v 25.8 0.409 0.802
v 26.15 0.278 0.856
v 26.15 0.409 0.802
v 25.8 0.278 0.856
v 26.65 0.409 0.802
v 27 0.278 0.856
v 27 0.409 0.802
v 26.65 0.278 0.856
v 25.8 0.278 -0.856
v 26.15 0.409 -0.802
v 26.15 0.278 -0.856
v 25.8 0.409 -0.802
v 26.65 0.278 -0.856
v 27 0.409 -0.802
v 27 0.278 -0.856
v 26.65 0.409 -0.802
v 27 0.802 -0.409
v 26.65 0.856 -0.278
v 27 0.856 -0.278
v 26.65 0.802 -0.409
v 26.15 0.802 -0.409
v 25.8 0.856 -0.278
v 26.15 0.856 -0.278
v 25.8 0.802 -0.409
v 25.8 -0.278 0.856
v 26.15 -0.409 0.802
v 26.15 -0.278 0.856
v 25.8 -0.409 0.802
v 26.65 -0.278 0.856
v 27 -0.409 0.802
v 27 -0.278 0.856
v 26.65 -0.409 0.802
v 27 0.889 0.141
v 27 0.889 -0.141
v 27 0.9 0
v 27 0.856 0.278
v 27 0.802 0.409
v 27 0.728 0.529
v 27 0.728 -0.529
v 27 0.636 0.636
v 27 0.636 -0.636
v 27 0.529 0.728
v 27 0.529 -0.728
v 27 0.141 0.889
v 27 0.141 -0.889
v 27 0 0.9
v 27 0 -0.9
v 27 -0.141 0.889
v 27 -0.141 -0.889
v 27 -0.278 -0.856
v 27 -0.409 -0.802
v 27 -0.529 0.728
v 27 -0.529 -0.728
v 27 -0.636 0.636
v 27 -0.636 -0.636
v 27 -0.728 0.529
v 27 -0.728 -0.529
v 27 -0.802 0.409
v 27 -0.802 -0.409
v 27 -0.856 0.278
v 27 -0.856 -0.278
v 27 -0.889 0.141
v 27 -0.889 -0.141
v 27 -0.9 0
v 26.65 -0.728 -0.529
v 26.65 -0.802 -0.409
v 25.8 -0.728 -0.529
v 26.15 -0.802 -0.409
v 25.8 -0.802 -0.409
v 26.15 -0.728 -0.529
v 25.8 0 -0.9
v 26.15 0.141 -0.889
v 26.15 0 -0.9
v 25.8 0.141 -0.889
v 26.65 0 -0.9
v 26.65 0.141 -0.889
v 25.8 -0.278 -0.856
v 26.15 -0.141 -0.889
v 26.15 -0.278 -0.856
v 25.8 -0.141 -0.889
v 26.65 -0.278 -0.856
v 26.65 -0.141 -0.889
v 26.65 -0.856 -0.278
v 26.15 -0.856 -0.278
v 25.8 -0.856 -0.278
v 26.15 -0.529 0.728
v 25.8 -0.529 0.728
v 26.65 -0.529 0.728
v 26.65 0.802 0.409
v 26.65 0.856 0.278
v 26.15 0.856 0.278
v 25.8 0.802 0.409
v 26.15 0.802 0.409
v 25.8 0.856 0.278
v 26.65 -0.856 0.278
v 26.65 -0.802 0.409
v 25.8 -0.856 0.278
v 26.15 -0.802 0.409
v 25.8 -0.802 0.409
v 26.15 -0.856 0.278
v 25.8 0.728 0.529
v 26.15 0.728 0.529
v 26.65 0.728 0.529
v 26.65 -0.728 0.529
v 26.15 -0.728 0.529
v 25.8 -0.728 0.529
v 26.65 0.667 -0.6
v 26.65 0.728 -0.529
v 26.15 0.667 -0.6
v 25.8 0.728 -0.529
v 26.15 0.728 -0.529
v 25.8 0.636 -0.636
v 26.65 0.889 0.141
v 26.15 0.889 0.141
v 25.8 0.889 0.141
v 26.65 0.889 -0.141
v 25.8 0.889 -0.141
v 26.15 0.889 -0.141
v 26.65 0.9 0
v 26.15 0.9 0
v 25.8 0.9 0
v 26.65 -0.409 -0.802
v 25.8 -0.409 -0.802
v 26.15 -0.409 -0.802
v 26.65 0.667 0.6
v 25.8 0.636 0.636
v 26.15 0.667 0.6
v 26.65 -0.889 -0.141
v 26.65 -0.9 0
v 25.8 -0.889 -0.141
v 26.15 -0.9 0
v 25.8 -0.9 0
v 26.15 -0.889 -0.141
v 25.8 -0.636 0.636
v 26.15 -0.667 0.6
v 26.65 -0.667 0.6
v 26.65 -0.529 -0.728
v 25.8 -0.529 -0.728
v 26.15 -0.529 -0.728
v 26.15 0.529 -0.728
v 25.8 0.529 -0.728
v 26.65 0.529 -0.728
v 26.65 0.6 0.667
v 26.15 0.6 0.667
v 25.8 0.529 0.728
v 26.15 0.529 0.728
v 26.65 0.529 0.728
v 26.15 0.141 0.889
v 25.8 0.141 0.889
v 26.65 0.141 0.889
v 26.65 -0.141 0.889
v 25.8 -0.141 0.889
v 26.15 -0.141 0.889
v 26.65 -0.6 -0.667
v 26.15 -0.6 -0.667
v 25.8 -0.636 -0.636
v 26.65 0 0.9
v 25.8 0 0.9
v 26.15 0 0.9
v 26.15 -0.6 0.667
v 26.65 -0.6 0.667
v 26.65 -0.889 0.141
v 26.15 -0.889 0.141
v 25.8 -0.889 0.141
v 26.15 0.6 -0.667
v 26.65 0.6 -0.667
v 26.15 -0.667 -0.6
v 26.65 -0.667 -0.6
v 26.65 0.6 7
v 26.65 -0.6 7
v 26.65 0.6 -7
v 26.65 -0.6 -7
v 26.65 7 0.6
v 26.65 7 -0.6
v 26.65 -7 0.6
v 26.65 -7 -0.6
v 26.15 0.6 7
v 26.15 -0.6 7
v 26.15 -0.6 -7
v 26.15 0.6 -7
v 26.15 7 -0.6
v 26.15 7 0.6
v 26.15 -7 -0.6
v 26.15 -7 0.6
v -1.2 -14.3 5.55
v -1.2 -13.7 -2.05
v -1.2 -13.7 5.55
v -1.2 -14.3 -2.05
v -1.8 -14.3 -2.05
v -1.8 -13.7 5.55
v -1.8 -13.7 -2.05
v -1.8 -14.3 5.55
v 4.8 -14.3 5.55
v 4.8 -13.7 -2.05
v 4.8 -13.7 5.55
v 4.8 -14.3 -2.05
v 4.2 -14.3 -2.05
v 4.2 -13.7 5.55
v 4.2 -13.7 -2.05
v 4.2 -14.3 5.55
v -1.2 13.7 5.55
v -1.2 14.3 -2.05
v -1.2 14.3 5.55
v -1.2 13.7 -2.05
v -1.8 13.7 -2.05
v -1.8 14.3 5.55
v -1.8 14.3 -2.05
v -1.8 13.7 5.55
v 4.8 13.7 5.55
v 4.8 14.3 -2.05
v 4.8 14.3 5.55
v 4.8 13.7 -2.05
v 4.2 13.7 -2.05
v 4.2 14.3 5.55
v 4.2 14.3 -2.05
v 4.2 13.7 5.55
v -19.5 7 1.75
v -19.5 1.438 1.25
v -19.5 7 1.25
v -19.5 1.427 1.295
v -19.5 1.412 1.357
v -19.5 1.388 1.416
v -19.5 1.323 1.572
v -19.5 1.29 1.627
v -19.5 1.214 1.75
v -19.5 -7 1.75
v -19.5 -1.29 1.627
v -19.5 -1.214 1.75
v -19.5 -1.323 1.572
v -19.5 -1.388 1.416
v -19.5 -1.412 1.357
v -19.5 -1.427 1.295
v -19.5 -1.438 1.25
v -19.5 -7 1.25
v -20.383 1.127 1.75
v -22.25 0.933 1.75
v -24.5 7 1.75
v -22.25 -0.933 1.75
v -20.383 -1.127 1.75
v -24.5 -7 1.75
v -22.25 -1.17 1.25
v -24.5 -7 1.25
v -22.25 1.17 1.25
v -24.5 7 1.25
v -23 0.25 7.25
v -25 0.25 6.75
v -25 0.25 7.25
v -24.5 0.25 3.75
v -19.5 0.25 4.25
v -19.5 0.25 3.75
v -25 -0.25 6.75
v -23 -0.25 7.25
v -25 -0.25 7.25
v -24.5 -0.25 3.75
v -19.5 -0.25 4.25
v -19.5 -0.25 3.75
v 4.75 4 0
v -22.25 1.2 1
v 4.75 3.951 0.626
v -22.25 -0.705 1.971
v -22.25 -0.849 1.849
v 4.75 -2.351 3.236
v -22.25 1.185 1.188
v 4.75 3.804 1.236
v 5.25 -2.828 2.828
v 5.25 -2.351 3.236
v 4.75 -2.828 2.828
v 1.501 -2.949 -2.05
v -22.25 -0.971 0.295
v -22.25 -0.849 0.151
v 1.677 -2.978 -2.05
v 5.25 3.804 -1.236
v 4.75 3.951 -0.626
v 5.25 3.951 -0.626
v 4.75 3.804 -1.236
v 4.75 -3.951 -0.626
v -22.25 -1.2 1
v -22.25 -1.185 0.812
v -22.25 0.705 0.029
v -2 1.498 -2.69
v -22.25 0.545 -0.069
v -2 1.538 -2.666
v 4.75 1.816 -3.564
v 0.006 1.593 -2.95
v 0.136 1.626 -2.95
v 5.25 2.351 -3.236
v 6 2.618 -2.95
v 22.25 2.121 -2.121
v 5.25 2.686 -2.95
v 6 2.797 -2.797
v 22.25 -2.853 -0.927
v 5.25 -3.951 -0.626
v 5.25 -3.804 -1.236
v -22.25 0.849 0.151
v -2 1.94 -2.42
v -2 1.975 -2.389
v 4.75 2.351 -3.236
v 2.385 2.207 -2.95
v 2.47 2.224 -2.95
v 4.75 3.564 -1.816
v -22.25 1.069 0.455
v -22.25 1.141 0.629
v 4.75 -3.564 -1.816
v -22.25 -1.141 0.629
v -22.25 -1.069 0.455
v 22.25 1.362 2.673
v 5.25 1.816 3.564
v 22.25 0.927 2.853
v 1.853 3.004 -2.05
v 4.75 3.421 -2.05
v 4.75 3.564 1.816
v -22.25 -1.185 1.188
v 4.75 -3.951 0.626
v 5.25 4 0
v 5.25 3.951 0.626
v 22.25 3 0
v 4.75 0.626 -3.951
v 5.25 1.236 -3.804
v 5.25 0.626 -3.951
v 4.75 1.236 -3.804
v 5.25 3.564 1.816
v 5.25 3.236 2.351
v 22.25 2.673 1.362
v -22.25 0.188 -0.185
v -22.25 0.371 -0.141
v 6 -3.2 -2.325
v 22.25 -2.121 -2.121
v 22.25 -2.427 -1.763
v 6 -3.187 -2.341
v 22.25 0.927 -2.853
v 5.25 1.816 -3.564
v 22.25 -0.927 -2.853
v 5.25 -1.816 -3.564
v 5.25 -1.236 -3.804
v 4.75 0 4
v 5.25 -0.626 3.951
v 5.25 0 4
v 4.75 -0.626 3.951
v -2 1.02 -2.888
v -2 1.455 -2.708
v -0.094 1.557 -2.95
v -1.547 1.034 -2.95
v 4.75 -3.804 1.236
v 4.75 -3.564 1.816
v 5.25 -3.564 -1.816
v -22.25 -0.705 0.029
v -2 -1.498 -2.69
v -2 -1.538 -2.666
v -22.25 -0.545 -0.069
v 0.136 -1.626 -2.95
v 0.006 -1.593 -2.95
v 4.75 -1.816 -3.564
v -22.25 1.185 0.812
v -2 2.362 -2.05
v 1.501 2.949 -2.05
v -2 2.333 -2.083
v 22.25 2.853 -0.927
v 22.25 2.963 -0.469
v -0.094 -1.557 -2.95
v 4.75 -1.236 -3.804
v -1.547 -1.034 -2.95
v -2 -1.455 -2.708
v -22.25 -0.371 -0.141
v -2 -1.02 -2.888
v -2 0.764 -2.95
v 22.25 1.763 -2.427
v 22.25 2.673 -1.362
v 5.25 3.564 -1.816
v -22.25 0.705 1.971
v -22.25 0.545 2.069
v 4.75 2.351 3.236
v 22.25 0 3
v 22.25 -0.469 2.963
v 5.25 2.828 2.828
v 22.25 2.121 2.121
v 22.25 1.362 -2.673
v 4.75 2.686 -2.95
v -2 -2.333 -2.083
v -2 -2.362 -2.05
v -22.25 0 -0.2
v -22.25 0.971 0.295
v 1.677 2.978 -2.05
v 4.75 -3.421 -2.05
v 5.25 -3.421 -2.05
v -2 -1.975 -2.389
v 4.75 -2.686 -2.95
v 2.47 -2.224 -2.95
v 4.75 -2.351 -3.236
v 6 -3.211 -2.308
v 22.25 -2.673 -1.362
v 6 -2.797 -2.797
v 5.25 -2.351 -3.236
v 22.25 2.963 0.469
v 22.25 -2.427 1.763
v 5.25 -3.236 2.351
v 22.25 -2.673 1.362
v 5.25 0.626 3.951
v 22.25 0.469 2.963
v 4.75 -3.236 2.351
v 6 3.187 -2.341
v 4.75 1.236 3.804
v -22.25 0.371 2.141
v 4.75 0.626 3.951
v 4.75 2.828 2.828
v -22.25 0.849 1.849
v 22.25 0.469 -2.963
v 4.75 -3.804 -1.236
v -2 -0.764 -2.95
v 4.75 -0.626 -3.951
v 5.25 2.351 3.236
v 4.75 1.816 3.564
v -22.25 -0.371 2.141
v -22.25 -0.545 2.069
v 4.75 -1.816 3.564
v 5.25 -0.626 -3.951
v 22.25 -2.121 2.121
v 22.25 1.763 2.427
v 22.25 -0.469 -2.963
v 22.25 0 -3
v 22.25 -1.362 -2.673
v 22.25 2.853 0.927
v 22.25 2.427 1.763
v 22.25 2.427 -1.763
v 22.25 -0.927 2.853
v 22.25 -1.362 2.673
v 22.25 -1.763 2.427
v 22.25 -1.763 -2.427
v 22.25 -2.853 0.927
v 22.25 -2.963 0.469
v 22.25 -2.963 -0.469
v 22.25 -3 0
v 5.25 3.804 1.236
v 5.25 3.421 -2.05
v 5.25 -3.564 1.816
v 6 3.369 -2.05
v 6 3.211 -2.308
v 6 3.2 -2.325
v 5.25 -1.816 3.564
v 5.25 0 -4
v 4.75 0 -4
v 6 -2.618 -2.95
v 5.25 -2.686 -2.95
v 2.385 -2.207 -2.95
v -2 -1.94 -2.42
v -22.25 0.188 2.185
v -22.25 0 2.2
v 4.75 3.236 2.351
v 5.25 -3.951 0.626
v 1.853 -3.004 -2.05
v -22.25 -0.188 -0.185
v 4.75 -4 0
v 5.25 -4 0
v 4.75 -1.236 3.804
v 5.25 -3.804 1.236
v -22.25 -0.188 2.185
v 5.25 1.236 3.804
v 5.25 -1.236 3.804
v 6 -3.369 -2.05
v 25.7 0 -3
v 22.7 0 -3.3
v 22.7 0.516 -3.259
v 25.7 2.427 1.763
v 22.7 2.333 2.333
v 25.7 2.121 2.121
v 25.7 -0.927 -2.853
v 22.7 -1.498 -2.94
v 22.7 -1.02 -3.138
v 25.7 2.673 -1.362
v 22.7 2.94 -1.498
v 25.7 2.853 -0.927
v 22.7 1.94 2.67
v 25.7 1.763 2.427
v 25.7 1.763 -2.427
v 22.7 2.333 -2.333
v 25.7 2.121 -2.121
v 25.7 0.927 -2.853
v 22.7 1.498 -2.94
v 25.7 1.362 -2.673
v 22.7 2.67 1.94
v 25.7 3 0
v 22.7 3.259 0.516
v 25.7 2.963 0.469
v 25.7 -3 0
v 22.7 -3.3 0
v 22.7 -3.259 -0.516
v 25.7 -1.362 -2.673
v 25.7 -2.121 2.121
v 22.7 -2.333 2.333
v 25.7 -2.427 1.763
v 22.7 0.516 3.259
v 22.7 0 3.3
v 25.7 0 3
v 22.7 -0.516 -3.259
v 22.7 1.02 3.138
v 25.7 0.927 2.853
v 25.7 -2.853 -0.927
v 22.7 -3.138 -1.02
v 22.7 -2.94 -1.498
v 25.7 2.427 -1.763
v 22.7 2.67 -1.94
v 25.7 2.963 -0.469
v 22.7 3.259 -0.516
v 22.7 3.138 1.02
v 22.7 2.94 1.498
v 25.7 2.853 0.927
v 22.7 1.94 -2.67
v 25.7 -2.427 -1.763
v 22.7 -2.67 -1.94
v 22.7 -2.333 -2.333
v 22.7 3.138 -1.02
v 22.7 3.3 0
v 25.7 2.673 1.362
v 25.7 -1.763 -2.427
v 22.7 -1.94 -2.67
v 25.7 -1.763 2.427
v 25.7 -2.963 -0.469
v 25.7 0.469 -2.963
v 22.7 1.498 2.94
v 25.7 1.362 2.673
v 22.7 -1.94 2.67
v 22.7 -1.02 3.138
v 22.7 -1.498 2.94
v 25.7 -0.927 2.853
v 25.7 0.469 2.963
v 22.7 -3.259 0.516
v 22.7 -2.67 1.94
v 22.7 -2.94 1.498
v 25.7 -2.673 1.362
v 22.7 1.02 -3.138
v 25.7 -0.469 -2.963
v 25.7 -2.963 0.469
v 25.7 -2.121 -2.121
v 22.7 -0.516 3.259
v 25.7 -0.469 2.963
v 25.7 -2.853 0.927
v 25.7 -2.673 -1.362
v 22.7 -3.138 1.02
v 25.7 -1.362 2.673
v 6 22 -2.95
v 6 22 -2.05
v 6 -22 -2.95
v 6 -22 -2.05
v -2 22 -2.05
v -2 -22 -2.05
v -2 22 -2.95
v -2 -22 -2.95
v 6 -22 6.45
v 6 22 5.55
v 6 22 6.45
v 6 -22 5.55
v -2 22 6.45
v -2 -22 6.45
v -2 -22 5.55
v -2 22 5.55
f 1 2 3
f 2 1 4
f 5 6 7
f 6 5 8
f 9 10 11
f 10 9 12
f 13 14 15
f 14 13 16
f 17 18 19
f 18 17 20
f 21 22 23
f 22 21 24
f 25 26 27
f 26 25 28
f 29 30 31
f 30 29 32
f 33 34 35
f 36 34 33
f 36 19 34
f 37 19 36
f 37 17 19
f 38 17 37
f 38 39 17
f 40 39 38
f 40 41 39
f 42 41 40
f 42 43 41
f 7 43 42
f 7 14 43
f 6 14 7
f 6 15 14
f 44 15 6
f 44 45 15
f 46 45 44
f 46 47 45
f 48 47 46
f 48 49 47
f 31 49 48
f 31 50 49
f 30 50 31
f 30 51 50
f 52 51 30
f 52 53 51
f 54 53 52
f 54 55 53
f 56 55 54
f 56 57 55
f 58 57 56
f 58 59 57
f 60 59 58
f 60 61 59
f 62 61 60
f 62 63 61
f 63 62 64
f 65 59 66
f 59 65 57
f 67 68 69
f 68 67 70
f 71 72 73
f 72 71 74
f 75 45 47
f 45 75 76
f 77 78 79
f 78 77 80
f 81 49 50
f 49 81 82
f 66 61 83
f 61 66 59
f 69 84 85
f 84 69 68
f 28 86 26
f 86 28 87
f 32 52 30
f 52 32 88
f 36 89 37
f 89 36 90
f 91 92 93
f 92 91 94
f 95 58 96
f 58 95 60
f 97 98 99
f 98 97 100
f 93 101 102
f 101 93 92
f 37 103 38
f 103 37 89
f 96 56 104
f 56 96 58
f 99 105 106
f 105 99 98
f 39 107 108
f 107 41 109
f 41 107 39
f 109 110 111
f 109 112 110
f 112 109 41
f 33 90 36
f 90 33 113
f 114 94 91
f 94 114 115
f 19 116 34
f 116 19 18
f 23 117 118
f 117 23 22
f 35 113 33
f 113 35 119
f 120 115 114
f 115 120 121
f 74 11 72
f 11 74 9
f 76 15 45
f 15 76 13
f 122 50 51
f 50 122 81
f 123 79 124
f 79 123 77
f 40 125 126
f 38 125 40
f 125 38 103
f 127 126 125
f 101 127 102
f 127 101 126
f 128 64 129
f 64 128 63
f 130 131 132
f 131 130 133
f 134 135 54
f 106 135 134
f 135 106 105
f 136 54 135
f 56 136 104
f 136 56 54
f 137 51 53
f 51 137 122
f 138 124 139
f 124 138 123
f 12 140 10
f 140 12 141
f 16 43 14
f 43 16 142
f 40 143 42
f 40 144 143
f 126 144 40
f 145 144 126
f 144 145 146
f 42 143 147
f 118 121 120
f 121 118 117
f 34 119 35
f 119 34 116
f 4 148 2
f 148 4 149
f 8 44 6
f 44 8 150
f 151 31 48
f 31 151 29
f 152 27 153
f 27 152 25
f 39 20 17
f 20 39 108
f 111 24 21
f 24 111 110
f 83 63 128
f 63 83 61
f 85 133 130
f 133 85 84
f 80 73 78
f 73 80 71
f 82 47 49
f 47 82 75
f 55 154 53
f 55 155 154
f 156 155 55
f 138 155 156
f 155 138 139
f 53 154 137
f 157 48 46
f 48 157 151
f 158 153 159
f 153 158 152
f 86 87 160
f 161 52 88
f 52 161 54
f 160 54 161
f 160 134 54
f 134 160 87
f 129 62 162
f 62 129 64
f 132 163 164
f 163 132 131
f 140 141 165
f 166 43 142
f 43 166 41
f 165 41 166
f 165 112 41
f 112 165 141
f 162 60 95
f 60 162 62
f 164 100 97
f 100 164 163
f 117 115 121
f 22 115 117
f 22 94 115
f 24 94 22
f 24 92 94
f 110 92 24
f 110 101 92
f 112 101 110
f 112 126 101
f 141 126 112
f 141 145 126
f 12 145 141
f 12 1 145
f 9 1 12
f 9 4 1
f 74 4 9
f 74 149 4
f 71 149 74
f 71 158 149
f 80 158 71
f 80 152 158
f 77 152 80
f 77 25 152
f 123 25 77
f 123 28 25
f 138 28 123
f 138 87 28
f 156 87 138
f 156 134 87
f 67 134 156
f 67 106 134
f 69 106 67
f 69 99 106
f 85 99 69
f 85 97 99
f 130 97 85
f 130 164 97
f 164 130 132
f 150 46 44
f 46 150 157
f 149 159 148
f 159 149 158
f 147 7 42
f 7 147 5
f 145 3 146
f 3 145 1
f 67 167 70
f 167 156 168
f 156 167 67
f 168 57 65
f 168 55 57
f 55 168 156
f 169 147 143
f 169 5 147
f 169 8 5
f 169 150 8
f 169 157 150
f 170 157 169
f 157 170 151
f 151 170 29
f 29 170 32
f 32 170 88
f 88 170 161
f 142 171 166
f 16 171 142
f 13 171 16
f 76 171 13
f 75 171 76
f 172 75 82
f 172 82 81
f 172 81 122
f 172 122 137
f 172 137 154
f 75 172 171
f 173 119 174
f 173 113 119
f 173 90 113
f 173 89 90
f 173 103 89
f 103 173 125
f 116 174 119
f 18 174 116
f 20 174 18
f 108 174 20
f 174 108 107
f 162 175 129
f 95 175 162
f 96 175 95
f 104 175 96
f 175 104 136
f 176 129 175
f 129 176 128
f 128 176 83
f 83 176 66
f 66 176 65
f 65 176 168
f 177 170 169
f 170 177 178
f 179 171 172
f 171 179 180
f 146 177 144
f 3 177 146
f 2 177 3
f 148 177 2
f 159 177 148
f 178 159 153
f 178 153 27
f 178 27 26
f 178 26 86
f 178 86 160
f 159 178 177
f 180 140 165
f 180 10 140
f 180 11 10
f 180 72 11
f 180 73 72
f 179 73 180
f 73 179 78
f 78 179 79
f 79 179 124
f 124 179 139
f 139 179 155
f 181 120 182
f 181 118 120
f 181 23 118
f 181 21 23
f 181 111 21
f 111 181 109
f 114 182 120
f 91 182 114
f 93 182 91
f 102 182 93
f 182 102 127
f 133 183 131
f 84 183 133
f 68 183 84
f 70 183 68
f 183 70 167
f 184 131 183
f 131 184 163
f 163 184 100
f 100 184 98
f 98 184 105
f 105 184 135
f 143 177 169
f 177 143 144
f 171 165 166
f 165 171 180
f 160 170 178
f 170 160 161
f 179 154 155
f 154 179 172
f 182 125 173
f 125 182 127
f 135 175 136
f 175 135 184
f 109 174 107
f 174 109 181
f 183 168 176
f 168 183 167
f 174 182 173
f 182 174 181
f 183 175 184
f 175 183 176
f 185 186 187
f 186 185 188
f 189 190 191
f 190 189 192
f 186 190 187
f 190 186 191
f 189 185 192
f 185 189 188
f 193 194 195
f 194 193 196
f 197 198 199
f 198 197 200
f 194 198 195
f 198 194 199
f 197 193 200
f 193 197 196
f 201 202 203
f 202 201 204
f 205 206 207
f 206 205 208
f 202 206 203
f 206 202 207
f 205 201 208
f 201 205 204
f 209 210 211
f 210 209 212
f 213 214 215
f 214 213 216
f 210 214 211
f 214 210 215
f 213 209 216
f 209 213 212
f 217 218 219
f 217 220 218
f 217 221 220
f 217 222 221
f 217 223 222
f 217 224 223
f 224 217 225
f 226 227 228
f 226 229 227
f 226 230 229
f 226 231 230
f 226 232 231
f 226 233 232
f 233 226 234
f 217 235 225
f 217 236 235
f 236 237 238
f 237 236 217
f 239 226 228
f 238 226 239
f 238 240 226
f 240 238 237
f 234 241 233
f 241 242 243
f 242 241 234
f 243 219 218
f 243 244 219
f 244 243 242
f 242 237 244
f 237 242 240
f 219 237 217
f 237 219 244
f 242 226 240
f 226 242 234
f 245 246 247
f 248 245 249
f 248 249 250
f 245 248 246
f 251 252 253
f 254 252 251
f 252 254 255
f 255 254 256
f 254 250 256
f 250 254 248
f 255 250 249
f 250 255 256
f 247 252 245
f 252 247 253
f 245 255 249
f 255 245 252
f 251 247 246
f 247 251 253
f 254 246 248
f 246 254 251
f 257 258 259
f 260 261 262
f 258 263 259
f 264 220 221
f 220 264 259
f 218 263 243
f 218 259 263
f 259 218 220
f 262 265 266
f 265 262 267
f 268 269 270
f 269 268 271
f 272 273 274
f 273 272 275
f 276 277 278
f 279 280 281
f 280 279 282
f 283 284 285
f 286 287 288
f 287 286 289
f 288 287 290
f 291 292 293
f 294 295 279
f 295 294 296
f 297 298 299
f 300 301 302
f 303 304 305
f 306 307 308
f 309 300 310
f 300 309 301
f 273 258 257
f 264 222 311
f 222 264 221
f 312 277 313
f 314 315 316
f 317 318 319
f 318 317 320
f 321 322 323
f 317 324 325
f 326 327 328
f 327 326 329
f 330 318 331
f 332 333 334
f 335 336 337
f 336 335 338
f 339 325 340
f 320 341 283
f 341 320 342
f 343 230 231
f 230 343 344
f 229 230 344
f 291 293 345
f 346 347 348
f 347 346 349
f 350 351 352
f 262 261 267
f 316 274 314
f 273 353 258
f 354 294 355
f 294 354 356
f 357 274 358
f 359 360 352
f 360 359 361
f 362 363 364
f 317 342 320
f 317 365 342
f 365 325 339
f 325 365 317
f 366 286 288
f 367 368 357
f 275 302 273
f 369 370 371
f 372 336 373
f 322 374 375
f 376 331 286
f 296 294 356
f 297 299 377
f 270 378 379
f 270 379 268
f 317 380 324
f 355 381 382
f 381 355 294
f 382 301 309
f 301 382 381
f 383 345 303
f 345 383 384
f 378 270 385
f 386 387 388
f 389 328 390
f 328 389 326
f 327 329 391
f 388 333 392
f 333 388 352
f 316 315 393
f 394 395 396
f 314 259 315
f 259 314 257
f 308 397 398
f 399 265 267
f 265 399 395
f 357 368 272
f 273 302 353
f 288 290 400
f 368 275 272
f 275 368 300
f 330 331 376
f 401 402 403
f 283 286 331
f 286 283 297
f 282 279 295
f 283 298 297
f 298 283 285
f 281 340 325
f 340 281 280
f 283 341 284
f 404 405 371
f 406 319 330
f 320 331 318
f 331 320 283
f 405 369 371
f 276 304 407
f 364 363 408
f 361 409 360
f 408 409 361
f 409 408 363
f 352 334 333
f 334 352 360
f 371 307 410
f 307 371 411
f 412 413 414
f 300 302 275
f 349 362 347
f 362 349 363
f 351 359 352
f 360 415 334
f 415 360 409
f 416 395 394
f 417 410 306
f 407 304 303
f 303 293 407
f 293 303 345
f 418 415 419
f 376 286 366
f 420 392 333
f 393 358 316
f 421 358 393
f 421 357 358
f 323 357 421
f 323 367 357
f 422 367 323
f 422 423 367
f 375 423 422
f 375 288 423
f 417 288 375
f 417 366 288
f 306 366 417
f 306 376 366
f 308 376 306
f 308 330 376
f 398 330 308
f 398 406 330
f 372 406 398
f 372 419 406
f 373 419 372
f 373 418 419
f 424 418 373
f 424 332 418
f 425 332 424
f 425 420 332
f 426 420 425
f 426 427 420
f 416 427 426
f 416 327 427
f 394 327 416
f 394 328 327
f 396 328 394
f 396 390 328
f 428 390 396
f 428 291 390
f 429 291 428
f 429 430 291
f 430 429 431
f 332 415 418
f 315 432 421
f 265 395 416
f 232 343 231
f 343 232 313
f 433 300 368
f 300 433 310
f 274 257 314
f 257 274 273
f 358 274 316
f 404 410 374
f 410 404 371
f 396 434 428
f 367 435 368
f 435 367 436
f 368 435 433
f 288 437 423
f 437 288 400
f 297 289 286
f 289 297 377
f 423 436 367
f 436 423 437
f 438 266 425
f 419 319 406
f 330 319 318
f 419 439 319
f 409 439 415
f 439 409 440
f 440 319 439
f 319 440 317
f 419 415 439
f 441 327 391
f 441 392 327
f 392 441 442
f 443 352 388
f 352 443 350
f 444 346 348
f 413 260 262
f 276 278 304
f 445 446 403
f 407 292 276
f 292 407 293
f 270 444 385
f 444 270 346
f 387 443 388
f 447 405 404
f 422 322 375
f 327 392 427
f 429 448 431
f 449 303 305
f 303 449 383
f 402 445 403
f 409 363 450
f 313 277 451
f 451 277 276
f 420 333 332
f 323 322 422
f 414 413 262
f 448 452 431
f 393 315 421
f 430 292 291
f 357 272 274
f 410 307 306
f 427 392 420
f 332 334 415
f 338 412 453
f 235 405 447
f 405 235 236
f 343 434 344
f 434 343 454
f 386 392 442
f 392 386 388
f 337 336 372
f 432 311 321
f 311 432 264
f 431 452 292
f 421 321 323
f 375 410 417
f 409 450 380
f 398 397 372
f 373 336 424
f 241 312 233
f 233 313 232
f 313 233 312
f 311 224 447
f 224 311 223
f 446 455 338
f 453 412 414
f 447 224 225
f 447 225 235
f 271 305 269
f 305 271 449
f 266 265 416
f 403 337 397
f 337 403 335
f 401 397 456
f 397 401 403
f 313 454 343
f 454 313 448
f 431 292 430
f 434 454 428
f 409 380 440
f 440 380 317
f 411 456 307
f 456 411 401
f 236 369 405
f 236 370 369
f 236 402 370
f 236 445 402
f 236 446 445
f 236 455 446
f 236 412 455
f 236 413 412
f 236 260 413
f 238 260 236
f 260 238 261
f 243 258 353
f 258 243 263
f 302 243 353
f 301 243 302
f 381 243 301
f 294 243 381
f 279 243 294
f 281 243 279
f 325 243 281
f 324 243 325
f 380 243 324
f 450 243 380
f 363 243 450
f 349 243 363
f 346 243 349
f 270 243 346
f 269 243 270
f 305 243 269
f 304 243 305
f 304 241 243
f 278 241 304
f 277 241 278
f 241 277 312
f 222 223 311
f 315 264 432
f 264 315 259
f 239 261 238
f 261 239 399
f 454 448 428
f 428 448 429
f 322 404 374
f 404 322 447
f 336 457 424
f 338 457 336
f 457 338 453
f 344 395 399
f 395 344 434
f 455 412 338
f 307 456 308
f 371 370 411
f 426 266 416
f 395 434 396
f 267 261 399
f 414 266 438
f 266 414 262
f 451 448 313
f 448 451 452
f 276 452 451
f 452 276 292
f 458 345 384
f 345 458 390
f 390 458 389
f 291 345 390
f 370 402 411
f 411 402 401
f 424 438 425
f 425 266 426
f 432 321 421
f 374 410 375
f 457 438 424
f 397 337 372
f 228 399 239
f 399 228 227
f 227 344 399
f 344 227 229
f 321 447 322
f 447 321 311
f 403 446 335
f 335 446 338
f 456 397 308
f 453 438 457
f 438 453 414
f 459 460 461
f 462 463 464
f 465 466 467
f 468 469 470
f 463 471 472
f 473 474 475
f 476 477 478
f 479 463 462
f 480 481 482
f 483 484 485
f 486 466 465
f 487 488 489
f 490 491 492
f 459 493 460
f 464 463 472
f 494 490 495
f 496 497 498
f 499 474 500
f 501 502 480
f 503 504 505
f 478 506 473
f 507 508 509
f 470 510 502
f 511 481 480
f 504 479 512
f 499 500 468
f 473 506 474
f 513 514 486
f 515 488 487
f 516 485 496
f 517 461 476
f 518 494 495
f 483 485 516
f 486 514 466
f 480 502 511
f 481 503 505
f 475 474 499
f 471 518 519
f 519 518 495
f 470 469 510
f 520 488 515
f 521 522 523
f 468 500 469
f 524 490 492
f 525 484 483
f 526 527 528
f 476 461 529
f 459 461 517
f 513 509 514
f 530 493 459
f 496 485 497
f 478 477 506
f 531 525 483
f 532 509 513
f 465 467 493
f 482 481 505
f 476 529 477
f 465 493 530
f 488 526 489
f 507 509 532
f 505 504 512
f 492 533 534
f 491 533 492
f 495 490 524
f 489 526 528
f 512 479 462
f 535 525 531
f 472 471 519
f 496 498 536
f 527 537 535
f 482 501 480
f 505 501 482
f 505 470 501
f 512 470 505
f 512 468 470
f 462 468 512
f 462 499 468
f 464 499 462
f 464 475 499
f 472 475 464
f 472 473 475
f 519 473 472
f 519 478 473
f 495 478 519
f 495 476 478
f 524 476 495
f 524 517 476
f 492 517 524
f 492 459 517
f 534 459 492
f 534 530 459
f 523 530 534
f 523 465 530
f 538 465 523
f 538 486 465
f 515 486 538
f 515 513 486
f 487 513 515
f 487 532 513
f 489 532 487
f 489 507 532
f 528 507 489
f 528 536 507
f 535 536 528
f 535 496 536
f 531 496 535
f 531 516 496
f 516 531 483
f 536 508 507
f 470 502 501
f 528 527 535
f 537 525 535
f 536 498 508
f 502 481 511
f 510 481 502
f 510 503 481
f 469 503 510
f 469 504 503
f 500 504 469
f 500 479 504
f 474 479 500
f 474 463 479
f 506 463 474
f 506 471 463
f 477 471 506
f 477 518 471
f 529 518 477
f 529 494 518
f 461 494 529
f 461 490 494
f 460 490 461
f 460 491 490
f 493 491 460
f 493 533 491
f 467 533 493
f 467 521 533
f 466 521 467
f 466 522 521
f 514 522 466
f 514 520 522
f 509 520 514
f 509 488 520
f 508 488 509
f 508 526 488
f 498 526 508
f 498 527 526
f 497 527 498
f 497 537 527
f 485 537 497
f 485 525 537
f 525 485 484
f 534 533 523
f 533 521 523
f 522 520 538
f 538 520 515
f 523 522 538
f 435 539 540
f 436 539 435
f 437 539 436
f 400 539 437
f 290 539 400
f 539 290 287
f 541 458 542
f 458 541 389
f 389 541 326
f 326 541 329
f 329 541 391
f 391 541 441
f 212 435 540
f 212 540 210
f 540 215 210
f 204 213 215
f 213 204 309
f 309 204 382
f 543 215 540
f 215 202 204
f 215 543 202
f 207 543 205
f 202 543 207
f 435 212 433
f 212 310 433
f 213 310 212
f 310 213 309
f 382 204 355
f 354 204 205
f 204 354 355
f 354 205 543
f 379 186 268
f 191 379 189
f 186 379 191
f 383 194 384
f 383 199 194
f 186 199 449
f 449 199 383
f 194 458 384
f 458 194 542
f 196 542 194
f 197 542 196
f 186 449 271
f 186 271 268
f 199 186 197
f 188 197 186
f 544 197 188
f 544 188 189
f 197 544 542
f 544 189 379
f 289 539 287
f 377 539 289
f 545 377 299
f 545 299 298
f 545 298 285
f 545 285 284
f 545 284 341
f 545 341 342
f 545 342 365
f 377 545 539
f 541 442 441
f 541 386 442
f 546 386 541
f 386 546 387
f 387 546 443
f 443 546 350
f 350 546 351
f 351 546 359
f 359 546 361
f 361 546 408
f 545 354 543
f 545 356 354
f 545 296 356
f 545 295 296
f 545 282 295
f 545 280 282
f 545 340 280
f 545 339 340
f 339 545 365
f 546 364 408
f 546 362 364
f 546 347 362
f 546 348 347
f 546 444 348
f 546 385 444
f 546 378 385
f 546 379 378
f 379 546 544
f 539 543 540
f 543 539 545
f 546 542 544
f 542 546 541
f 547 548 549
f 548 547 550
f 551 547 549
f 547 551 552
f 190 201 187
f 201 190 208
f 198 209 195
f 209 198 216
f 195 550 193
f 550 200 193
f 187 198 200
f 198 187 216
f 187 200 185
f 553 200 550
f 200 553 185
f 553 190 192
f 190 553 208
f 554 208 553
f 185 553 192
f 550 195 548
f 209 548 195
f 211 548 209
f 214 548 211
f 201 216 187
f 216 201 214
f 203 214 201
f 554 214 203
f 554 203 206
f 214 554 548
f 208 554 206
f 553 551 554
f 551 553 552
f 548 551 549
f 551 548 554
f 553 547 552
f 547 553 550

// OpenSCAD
// Vintage biplane — sky-blue fuselage with twin canvas wings, a yellow nose
// cowling, a red tail, a dark propeller, and wooden interplane struts.
module label(name) { children(); }

$fn = 40;

// --- fuselage: tapered body via hull of three rings along +X (nose at +X) ---
label("fuselage") hull() {
  translate([22, 0, 0]) rotate([0, 90, 0]) cylinder(h=0.5, r=3.0, center=true);
  translate([ 5, 0, 0]) rotate([0, 90, 0]) cylinder(h=0.5, r=4.0, center=true);
  translate([-22, 0, 1]) rotate([0, 90, 0]) cylinder(h=0.5, r=1.2, center=true);
}

// --- engine cowling: short fat truncated cone at the nose ---
label("cowling") translate([24.2, 0, 0]) rotate([0, 90, 0])
  cylinder(h=3, r1=3.3, r2=3.0, center=true);

// --- propeller: hub plus two crossed blades at the very tip ---
label("propeller") translate([26.4, 0, 0]) union() {
  // hub: short cylinder pointing along +X (prop shaft axis)
  rotate([0, 90, 0]) cylinder(h=1.2, r=0.9, center=true);
  // vertical blade (long in Z, thin in X)
  cube([0.5, 1.2, 14], center=true);
  // horizontal blade (long in Y, thin in X)
  cube([0.5, 14, 1.2], center=true);
}

// --- lower wing: long thin slab through the belly ---
label("lower-wing") translate([2, 0, -2.5])
  cube([8, 44, 0.9], center=true);

// --- upper wing: parallel slab above the fuselage ---
label("upper-wing") translate([2, 0, 6])
  cube([8, 44, 0.9], center=true);

// --- struts: four vertical posts joining the wings ---
label("strut") union() {
  for (sy = [-14, 14], sx = [-1.5, 4.5])
    translate([sx, sy, 1.8]) cube([0.6, 0.6, 8.8], center=true);
}

// --- tail group: vertical fin + horizontal stabilizer ---
label("tail") union() {
  // horizontal stabilizer
  translate([-22, 0, 1.5]) cube([5, 14, 0.5], center=true);
  // vertical fin built from a hull so it sweeps up + back
  hull() {
    translate([-22, 0, 4]) cube([5, 0.5, 0.5], center=true);
    translate([-24, 0, 7]) cube([2, 0.5, 0.5], center=true);
  }
}
